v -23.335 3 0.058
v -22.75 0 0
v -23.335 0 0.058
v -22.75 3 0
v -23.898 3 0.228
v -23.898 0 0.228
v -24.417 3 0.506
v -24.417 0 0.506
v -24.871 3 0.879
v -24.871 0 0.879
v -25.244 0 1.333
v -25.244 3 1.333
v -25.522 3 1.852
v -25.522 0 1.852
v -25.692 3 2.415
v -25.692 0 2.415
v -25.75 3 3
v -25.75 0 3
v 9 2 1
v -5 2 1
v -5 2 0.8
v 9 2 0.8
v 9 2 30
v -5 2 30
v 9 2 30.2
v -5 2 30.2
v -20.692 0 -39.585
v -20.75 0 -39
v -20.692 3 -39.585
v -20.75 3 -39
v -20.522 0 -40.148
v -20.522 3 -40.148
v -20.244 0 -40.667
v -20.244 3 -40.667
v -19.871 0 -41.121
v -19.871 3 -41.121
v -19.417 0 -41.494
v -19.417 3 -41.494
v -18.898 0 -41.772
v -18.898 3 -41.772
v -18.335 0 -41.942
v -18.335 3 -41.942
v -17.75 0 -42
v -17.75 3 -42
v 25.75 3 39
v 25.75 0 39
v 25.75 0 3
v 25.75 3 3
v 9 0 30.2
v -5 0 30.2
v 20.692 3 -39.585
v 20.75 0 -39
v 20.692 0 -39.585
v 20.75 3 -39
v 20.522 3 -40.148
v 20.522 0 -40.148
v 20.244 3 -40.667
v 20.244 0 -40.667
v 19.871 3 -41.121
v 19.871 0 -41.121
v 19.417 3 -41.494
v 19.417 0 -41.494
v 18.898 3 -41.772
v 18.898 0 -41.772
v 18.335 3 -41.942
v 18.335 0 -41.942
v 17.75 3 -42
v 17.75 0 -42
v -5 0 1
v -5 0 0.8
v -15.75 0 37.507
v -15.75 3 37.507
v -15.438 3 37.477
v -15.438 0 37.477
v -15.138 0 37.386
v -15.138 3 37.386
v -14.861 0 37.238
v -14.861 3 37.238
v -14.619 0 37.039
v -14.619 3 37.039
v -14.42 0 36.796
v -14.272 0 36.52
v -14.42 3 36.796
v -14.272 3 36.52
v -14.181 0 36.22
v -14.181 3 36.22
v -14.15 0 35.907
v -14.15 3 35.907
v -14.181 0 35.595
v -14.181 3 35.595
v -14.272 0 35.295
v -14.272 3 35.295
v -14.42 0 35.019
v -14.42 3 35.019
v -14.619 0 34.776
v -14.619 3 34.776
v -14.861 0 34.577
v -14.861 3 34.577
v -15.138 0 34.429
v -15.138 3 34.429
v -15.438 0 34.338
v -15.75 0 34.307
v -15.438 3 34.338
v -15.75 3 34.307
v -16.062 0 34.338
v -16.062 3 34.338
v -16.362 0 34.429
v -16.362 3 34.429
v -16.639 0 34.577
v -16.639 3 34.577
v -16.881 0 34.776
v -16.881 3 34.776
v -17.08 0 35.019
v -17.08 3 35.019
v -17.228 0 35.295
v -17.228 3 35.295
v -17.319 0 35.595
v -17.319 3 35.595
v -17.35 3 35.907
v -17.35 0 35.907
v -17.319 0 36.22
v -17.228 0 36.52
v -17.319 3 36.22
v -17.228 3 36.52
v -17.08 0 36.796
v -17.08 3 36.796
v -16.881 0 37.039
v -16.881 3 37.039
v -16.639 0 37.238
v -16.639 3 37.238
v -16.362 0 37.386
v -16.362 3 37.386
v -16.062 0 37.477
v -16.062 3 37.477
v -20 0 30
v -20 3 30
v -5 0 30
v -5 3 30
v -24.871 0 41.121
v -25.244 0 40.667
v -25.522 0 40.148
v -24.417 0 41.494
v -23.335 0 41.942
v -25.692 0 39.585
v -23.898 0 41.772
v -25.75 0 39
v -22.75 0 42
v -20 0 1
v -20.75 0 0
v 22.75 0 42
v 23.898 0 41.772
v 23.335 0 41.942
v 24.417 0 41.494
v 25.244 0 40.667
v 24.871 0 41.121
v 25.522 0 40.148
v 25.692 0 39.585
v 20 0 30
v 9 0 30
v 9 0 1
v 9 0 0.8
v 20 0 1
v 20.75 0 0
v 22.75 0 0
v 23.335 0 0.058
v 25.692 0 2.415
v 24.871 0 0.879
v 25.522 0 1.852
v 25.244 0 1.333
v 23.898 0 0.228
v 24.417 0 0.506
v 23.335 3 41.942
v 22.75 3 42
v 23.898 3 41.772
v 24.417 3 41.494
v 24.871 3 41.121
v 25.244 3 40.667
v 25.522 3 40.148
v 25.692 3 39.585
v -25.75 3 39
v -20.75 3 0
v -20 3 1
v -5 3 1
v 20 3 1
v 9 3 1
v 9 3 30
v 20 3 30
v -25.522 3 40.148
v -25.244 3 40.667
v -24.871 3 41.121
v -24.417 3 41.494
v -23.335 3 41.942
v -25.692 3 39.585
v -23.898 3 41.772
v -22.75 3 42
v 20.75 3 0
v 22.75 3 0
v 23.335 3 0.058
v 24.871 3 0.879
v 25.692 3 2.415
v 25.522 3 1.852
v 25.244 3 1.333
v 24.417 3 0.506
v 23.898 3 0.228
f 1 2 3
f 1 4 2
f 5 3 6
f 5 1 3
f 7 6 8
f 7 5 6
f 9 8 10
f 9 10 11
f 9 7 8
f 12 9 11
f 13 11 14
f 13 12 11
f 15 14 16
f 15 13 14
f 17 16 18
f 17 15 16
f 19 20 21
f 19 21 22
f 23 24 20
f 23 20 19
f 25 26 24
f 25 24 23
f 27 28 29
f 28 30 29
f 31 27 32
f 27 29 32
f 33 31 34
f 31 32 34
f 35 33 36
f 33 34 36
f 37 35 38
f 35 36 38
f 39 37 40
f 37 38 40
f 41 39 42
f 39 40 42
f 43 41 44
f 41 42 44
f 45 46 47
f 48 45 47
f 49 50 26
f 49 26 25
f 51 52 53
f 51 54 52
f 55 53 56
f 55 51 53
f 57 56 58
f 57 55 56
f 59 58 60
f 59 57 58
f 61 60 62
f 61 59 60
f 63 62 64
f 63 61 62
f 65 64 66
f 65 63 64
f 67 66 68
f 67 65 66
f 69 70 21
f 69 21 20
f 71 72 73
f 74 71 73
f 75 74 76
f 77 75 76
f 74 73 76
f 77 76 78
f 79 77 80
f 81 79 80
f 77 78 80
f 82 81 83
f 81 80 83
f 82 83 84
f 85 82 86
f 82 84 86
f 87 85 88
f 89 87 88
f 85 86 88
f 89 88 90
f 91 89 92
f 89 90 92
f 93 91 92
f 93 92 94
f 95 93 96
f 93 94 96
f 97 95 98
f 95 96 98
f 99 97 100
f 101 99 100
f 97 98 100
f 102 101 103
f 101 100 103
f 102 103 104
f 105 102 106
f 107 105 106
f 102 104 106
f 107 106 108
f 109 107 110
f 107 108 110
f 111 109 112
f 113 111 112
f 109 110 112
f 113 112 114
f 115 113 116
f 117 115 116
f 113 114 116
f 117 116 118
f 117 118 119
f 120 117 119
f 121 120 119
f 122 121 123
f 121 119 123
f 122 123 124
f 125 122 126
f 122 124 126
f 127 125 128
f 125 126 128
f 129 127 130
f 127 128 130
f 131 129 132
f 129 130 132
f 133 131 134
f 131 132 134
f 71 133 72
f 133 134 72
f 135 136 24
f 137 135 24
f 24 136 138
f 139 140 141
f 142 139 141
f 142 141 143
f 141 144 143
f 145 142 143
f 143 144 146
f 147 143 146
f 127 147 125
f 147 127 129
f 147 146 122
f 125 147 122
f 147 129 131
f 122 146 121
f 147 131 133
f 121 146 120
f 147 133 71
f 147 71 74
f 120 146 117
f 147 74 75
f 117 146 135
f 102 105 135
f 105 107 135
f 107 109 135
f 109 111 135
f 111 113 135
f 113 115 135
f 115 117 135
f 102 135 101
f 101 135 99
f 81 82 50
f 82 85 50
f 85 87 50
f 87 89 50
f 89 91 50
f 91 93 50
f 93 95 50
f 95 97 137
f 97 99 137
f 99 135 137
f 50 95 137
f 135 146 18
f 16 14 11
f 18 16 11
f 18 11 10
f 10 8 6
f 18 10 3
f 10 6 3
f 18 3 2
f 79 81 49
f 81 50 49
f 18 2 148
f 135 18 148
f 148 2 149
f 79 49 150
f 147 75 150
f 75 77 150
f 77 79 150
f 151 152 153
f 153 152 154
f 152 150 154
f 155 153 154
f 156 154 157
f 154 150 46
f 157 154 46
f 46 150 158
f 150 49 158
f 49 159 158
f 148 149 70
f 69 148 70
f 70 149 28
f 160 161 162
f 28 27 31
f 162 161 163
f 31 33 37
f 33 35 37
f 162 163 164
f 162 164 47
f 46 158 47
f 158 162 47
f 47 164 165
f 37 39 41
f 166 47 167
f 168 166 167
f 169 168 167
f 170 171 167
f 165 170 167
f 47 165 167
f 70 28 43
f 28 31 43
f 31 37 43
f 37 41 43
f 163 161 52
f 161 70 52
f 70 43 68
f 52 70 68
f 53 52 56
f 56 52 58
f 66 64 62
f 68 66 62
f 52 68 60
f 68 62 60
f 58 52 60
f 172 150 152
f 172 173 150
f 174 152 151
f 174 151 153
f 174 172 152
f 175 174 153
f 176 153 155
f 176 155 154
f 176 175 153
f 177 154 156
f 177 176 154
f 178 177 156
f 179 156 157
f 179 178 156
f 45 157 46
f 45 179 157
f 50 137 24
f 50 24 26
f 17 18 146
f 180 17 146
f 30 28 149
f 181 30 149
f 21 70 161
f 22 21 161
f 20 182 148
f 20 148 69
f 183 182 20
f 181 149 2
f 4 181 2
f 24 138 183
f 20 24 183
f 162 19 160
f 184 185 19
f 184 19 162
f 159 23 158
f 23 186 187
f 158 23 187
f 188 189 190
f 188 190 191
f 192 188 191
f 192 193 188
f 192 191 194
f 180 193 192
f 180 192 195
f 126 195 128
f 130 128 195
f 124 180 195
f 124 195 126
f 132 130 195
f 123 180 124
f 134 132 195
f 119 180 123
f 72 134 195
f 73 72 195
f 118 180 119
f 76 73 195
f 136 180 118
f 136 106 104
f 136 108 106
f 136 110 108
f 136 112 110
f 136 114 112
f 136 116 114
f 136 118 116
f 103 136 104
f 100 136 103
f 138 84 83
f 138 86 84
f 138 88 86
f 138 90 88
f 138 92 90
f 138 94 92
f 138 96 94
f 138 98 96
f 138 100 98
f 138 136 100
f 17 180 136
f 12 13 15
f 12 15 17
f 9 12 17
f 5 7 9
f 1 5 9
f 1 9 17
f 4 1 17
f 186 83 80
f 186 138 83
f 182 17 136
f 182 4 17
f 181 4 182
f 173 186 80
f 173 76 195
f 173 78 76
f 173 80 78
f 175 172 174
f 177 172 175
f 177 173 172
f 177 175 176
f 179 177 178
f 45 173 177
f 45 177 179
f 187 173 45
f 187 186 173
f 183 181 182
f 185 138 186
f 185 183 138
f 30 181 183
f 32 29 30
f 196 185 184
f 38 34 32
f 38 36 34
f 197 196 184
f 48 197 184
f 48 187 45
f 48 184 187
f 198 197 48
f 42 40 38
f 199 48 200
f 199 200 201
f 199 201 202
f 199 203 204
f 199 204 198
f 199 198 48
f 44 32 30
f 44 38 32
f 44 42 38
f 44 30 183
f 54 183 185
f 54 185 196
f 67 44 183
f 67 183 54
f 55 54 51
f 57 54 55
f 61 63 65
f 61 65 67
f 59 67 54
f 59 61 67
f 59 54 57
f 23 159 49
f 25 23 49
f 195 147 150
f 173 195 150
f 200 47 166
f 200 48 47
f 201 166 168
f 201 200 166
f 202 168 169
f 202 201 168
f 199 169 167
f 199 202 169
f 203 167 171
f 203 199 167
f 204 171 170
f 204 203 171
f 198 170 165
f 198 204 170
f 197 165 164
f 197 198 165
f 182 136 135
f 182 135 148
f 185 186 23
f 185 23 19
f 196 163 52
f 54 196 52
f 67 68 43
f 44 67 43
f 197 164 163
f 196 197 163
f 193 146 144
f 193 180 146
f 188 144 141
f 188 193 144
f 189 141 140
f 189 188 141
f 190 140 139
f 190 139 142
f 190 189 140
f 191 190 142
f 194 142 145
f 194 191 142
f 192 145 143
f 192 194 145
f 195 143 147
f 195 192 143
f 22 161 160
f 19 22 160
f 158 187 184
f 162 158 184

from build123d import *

# Parameters (mm, degrees)
BOSS_EXTRUDE1_DEPTH = 3
FILLET1_R           = 3
SKETCH2_R           = 1.6
SKETCH2_W           = 15
SKETCH2_H           = 29
SKETCH2_W_2         = 11
CUT_EXTRUDE1_DEPTH  = 3
SKETCH4_W           = 14
SKETCH4_H           = 29.4
CUT_EXTRUDE2_DEPTH  = 2


with BuildPart() as part:
    # Sketch1 → Boss-Extrude1 (new body)
    with BuildSketch(Plane(origin=(0, 0, 0), x_dir=(1, 0, 0), z_dir=(0, 1, 0))):
        Polygon((-20.75, 42), (-20.75, 0), (-25.75, 0), (-25.75, -42), (25.75, -42), (25.75, 0), (20.75, 0), (20.75, 42), align=None)
    extrude(amount=BOSS_EXTRUDE1_DEPTH)

    # Fillet1
    fillet1_edges = [part.edges().sort_by_distance(p)[0] for p in [
        (20.75, 1.5, -42),
        (25.75, 1.5, 0),
        (25.75, 1.5, 42),
        (-25.75, 1.5, 42),
        (-25.75, 1.5, 0),
        (-20.75, 1.5, -42),
    ]]
    fillet(fillet1_edges, radius=FILLET1_R)

    # Sketch2 → Cut-Extrude1 (cut)
    with BuildSketch(Plane(origin=(0, 3, 0), x_dir=(1, 0, 0), z_dir=(0, 1, 0))):
        with Locations(Location((-15.75, -35.907418342, 0), (0, 0, 270))):
            Circle(SKETCH2_R)
        with Locations((-12.5, -15.5)):
            Rectangle(SKETCH2_W, SKETCH2_H)
        with Locations((14.5, -15.5)):
            Rectangle(SKETCH2_W_2, SKETCH2_H)
    extrude(amount=-CUT_EXTRUDE1_DEPTH, mode=Mode.SUBTRACT)

    # Sketch4 → Cut-Extrude2 (cut)
    with BuildSketch(Plane.XZ):
        with Locations((2, 15.5)):
            Rectangle(SKETCH4_W, SKETCH4_H)
    extrude(amount=-CUT_EXTRUDE2_DEPTH, mode=Mode.SUBTRACT)


solid = part.part
